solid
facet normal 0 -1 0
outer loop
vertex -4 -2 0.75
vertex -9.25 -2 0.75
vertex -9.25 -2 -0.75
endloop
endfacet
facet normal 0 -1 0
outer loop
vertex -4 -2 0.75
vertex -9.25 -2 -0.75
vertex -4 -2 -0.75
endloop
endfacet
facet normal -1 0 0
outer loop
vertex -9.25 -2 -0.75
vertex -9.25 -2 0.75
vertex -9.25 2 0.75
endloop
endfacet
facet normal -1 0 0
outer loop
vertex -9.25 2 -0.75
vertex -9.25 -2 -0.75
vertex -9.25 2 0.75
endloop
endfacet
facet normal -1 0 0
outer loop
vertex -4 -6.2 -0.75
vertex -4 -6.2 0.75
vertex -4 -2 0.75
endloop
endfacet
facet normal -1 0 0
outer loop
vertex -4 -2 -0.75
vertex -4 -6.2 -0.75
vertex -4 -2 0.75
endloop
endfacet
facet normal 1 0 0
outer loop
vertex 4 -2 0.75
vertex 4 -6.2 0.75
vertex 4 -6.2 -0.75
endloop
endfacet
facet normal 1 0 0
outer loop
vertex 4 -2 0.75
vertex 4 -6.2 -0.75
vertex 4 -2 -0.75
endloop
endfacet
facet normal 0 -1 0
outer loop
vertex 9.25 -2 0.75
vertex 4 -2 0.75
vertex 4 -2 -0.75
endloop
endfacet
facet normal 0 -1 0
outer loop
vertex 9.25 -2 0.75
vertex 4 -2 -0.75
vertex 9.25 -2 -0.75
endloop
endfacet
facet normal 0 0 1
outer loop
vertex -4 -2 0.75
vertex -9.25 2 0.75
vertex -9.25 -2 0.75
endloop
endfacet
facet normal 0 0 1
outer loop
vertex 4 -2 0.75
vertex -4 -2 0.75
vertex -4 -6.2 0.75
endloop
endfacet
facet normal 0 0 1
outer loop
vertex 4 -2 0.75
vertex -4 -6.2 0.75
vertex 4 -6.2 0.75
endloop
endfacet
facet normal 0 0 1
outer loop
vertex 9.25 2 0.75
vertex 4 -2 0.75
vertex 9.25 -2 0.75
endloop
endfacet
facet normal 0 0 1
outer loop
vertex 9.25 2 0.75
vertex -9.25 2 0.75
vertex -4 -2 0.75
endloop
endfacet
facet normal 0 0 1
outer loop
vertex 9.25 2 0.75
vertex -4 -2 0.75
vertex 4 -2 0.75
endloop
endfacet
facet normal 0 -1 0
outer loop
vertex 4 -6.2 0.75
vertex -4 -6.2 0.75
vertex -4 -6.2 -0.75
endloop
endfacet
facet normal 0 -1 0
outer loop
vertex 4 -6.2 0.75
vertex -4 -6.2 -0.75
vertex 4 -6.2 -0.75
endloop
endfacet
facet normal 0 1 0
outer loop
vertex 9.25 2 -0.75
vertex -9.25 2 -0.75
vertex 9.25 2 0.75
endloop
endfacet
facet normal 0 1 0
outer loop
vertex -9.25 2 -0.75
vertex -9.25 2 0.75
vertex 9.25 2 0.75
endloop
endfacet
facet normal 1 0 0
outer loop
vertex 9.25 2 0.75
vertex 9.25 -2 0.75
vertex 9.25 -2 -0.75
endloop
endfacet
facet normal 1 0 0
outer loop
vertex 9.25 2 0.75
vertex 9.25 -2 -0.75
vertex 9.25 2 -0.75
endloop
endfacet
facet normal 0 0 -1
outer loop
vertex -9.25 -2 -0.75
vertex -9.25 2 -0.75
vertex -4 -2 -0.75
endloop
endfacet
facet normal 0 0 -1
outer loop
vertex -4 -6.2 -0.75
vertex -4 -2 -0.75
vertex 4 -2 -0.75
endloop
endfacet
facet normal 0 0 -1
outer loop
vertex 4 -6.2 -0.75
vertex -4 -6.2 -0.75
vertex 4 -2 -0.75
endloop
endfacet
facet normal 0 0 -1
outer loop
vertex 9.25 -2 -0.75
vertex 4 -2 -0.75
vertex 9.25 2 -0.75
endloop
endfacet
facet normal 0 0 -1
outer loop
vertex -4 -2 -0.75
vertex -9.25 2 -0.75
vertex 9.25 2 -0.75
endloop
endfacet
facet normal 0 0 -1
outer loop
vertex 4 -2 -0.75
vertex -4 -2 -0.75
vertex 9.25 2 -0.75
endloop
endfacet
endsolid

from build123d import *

# Parameters (mm, degrees)
SKETCH1_W           = 18.5
SKETCH1_H           = 4
BOSS_EXTRUDE1_DEPTH = 0.75
SKETCH2_W           = 8
SKETCH2_H           = 4.2
BOSS_EXTRUDE2_DEPTH = 0.75


with BuildPart() as part:
    # Sketch1 → Boss-Extrude1 (new body)
    with BuildSketch(Plane.XY):
        Rectangle(SKETCH1_W, SKETCH1_H)
    boss_extrude1 = extrude(amount=BOSS_EXTRUDE1_DEPTH)

    # Sketch2 → Boss-Extrude2 (add)
    with BuildSketch(Plane.XY):
        with Locations((0, -4.1)):
            Rectangle(SKETCH2_W, SKETCH2_H)
    boss_extrude2 = extrude(amount=BOSS_EXTRUDE2_DEPTH)

    # Mirror1: Boss-Extrude1, Boss-Extrude2 across plane
    add(boss_extrude1.mirror(Plane.XY))
    add(boss_extrude2.mirror(Plane.XY))


solid = part.part
